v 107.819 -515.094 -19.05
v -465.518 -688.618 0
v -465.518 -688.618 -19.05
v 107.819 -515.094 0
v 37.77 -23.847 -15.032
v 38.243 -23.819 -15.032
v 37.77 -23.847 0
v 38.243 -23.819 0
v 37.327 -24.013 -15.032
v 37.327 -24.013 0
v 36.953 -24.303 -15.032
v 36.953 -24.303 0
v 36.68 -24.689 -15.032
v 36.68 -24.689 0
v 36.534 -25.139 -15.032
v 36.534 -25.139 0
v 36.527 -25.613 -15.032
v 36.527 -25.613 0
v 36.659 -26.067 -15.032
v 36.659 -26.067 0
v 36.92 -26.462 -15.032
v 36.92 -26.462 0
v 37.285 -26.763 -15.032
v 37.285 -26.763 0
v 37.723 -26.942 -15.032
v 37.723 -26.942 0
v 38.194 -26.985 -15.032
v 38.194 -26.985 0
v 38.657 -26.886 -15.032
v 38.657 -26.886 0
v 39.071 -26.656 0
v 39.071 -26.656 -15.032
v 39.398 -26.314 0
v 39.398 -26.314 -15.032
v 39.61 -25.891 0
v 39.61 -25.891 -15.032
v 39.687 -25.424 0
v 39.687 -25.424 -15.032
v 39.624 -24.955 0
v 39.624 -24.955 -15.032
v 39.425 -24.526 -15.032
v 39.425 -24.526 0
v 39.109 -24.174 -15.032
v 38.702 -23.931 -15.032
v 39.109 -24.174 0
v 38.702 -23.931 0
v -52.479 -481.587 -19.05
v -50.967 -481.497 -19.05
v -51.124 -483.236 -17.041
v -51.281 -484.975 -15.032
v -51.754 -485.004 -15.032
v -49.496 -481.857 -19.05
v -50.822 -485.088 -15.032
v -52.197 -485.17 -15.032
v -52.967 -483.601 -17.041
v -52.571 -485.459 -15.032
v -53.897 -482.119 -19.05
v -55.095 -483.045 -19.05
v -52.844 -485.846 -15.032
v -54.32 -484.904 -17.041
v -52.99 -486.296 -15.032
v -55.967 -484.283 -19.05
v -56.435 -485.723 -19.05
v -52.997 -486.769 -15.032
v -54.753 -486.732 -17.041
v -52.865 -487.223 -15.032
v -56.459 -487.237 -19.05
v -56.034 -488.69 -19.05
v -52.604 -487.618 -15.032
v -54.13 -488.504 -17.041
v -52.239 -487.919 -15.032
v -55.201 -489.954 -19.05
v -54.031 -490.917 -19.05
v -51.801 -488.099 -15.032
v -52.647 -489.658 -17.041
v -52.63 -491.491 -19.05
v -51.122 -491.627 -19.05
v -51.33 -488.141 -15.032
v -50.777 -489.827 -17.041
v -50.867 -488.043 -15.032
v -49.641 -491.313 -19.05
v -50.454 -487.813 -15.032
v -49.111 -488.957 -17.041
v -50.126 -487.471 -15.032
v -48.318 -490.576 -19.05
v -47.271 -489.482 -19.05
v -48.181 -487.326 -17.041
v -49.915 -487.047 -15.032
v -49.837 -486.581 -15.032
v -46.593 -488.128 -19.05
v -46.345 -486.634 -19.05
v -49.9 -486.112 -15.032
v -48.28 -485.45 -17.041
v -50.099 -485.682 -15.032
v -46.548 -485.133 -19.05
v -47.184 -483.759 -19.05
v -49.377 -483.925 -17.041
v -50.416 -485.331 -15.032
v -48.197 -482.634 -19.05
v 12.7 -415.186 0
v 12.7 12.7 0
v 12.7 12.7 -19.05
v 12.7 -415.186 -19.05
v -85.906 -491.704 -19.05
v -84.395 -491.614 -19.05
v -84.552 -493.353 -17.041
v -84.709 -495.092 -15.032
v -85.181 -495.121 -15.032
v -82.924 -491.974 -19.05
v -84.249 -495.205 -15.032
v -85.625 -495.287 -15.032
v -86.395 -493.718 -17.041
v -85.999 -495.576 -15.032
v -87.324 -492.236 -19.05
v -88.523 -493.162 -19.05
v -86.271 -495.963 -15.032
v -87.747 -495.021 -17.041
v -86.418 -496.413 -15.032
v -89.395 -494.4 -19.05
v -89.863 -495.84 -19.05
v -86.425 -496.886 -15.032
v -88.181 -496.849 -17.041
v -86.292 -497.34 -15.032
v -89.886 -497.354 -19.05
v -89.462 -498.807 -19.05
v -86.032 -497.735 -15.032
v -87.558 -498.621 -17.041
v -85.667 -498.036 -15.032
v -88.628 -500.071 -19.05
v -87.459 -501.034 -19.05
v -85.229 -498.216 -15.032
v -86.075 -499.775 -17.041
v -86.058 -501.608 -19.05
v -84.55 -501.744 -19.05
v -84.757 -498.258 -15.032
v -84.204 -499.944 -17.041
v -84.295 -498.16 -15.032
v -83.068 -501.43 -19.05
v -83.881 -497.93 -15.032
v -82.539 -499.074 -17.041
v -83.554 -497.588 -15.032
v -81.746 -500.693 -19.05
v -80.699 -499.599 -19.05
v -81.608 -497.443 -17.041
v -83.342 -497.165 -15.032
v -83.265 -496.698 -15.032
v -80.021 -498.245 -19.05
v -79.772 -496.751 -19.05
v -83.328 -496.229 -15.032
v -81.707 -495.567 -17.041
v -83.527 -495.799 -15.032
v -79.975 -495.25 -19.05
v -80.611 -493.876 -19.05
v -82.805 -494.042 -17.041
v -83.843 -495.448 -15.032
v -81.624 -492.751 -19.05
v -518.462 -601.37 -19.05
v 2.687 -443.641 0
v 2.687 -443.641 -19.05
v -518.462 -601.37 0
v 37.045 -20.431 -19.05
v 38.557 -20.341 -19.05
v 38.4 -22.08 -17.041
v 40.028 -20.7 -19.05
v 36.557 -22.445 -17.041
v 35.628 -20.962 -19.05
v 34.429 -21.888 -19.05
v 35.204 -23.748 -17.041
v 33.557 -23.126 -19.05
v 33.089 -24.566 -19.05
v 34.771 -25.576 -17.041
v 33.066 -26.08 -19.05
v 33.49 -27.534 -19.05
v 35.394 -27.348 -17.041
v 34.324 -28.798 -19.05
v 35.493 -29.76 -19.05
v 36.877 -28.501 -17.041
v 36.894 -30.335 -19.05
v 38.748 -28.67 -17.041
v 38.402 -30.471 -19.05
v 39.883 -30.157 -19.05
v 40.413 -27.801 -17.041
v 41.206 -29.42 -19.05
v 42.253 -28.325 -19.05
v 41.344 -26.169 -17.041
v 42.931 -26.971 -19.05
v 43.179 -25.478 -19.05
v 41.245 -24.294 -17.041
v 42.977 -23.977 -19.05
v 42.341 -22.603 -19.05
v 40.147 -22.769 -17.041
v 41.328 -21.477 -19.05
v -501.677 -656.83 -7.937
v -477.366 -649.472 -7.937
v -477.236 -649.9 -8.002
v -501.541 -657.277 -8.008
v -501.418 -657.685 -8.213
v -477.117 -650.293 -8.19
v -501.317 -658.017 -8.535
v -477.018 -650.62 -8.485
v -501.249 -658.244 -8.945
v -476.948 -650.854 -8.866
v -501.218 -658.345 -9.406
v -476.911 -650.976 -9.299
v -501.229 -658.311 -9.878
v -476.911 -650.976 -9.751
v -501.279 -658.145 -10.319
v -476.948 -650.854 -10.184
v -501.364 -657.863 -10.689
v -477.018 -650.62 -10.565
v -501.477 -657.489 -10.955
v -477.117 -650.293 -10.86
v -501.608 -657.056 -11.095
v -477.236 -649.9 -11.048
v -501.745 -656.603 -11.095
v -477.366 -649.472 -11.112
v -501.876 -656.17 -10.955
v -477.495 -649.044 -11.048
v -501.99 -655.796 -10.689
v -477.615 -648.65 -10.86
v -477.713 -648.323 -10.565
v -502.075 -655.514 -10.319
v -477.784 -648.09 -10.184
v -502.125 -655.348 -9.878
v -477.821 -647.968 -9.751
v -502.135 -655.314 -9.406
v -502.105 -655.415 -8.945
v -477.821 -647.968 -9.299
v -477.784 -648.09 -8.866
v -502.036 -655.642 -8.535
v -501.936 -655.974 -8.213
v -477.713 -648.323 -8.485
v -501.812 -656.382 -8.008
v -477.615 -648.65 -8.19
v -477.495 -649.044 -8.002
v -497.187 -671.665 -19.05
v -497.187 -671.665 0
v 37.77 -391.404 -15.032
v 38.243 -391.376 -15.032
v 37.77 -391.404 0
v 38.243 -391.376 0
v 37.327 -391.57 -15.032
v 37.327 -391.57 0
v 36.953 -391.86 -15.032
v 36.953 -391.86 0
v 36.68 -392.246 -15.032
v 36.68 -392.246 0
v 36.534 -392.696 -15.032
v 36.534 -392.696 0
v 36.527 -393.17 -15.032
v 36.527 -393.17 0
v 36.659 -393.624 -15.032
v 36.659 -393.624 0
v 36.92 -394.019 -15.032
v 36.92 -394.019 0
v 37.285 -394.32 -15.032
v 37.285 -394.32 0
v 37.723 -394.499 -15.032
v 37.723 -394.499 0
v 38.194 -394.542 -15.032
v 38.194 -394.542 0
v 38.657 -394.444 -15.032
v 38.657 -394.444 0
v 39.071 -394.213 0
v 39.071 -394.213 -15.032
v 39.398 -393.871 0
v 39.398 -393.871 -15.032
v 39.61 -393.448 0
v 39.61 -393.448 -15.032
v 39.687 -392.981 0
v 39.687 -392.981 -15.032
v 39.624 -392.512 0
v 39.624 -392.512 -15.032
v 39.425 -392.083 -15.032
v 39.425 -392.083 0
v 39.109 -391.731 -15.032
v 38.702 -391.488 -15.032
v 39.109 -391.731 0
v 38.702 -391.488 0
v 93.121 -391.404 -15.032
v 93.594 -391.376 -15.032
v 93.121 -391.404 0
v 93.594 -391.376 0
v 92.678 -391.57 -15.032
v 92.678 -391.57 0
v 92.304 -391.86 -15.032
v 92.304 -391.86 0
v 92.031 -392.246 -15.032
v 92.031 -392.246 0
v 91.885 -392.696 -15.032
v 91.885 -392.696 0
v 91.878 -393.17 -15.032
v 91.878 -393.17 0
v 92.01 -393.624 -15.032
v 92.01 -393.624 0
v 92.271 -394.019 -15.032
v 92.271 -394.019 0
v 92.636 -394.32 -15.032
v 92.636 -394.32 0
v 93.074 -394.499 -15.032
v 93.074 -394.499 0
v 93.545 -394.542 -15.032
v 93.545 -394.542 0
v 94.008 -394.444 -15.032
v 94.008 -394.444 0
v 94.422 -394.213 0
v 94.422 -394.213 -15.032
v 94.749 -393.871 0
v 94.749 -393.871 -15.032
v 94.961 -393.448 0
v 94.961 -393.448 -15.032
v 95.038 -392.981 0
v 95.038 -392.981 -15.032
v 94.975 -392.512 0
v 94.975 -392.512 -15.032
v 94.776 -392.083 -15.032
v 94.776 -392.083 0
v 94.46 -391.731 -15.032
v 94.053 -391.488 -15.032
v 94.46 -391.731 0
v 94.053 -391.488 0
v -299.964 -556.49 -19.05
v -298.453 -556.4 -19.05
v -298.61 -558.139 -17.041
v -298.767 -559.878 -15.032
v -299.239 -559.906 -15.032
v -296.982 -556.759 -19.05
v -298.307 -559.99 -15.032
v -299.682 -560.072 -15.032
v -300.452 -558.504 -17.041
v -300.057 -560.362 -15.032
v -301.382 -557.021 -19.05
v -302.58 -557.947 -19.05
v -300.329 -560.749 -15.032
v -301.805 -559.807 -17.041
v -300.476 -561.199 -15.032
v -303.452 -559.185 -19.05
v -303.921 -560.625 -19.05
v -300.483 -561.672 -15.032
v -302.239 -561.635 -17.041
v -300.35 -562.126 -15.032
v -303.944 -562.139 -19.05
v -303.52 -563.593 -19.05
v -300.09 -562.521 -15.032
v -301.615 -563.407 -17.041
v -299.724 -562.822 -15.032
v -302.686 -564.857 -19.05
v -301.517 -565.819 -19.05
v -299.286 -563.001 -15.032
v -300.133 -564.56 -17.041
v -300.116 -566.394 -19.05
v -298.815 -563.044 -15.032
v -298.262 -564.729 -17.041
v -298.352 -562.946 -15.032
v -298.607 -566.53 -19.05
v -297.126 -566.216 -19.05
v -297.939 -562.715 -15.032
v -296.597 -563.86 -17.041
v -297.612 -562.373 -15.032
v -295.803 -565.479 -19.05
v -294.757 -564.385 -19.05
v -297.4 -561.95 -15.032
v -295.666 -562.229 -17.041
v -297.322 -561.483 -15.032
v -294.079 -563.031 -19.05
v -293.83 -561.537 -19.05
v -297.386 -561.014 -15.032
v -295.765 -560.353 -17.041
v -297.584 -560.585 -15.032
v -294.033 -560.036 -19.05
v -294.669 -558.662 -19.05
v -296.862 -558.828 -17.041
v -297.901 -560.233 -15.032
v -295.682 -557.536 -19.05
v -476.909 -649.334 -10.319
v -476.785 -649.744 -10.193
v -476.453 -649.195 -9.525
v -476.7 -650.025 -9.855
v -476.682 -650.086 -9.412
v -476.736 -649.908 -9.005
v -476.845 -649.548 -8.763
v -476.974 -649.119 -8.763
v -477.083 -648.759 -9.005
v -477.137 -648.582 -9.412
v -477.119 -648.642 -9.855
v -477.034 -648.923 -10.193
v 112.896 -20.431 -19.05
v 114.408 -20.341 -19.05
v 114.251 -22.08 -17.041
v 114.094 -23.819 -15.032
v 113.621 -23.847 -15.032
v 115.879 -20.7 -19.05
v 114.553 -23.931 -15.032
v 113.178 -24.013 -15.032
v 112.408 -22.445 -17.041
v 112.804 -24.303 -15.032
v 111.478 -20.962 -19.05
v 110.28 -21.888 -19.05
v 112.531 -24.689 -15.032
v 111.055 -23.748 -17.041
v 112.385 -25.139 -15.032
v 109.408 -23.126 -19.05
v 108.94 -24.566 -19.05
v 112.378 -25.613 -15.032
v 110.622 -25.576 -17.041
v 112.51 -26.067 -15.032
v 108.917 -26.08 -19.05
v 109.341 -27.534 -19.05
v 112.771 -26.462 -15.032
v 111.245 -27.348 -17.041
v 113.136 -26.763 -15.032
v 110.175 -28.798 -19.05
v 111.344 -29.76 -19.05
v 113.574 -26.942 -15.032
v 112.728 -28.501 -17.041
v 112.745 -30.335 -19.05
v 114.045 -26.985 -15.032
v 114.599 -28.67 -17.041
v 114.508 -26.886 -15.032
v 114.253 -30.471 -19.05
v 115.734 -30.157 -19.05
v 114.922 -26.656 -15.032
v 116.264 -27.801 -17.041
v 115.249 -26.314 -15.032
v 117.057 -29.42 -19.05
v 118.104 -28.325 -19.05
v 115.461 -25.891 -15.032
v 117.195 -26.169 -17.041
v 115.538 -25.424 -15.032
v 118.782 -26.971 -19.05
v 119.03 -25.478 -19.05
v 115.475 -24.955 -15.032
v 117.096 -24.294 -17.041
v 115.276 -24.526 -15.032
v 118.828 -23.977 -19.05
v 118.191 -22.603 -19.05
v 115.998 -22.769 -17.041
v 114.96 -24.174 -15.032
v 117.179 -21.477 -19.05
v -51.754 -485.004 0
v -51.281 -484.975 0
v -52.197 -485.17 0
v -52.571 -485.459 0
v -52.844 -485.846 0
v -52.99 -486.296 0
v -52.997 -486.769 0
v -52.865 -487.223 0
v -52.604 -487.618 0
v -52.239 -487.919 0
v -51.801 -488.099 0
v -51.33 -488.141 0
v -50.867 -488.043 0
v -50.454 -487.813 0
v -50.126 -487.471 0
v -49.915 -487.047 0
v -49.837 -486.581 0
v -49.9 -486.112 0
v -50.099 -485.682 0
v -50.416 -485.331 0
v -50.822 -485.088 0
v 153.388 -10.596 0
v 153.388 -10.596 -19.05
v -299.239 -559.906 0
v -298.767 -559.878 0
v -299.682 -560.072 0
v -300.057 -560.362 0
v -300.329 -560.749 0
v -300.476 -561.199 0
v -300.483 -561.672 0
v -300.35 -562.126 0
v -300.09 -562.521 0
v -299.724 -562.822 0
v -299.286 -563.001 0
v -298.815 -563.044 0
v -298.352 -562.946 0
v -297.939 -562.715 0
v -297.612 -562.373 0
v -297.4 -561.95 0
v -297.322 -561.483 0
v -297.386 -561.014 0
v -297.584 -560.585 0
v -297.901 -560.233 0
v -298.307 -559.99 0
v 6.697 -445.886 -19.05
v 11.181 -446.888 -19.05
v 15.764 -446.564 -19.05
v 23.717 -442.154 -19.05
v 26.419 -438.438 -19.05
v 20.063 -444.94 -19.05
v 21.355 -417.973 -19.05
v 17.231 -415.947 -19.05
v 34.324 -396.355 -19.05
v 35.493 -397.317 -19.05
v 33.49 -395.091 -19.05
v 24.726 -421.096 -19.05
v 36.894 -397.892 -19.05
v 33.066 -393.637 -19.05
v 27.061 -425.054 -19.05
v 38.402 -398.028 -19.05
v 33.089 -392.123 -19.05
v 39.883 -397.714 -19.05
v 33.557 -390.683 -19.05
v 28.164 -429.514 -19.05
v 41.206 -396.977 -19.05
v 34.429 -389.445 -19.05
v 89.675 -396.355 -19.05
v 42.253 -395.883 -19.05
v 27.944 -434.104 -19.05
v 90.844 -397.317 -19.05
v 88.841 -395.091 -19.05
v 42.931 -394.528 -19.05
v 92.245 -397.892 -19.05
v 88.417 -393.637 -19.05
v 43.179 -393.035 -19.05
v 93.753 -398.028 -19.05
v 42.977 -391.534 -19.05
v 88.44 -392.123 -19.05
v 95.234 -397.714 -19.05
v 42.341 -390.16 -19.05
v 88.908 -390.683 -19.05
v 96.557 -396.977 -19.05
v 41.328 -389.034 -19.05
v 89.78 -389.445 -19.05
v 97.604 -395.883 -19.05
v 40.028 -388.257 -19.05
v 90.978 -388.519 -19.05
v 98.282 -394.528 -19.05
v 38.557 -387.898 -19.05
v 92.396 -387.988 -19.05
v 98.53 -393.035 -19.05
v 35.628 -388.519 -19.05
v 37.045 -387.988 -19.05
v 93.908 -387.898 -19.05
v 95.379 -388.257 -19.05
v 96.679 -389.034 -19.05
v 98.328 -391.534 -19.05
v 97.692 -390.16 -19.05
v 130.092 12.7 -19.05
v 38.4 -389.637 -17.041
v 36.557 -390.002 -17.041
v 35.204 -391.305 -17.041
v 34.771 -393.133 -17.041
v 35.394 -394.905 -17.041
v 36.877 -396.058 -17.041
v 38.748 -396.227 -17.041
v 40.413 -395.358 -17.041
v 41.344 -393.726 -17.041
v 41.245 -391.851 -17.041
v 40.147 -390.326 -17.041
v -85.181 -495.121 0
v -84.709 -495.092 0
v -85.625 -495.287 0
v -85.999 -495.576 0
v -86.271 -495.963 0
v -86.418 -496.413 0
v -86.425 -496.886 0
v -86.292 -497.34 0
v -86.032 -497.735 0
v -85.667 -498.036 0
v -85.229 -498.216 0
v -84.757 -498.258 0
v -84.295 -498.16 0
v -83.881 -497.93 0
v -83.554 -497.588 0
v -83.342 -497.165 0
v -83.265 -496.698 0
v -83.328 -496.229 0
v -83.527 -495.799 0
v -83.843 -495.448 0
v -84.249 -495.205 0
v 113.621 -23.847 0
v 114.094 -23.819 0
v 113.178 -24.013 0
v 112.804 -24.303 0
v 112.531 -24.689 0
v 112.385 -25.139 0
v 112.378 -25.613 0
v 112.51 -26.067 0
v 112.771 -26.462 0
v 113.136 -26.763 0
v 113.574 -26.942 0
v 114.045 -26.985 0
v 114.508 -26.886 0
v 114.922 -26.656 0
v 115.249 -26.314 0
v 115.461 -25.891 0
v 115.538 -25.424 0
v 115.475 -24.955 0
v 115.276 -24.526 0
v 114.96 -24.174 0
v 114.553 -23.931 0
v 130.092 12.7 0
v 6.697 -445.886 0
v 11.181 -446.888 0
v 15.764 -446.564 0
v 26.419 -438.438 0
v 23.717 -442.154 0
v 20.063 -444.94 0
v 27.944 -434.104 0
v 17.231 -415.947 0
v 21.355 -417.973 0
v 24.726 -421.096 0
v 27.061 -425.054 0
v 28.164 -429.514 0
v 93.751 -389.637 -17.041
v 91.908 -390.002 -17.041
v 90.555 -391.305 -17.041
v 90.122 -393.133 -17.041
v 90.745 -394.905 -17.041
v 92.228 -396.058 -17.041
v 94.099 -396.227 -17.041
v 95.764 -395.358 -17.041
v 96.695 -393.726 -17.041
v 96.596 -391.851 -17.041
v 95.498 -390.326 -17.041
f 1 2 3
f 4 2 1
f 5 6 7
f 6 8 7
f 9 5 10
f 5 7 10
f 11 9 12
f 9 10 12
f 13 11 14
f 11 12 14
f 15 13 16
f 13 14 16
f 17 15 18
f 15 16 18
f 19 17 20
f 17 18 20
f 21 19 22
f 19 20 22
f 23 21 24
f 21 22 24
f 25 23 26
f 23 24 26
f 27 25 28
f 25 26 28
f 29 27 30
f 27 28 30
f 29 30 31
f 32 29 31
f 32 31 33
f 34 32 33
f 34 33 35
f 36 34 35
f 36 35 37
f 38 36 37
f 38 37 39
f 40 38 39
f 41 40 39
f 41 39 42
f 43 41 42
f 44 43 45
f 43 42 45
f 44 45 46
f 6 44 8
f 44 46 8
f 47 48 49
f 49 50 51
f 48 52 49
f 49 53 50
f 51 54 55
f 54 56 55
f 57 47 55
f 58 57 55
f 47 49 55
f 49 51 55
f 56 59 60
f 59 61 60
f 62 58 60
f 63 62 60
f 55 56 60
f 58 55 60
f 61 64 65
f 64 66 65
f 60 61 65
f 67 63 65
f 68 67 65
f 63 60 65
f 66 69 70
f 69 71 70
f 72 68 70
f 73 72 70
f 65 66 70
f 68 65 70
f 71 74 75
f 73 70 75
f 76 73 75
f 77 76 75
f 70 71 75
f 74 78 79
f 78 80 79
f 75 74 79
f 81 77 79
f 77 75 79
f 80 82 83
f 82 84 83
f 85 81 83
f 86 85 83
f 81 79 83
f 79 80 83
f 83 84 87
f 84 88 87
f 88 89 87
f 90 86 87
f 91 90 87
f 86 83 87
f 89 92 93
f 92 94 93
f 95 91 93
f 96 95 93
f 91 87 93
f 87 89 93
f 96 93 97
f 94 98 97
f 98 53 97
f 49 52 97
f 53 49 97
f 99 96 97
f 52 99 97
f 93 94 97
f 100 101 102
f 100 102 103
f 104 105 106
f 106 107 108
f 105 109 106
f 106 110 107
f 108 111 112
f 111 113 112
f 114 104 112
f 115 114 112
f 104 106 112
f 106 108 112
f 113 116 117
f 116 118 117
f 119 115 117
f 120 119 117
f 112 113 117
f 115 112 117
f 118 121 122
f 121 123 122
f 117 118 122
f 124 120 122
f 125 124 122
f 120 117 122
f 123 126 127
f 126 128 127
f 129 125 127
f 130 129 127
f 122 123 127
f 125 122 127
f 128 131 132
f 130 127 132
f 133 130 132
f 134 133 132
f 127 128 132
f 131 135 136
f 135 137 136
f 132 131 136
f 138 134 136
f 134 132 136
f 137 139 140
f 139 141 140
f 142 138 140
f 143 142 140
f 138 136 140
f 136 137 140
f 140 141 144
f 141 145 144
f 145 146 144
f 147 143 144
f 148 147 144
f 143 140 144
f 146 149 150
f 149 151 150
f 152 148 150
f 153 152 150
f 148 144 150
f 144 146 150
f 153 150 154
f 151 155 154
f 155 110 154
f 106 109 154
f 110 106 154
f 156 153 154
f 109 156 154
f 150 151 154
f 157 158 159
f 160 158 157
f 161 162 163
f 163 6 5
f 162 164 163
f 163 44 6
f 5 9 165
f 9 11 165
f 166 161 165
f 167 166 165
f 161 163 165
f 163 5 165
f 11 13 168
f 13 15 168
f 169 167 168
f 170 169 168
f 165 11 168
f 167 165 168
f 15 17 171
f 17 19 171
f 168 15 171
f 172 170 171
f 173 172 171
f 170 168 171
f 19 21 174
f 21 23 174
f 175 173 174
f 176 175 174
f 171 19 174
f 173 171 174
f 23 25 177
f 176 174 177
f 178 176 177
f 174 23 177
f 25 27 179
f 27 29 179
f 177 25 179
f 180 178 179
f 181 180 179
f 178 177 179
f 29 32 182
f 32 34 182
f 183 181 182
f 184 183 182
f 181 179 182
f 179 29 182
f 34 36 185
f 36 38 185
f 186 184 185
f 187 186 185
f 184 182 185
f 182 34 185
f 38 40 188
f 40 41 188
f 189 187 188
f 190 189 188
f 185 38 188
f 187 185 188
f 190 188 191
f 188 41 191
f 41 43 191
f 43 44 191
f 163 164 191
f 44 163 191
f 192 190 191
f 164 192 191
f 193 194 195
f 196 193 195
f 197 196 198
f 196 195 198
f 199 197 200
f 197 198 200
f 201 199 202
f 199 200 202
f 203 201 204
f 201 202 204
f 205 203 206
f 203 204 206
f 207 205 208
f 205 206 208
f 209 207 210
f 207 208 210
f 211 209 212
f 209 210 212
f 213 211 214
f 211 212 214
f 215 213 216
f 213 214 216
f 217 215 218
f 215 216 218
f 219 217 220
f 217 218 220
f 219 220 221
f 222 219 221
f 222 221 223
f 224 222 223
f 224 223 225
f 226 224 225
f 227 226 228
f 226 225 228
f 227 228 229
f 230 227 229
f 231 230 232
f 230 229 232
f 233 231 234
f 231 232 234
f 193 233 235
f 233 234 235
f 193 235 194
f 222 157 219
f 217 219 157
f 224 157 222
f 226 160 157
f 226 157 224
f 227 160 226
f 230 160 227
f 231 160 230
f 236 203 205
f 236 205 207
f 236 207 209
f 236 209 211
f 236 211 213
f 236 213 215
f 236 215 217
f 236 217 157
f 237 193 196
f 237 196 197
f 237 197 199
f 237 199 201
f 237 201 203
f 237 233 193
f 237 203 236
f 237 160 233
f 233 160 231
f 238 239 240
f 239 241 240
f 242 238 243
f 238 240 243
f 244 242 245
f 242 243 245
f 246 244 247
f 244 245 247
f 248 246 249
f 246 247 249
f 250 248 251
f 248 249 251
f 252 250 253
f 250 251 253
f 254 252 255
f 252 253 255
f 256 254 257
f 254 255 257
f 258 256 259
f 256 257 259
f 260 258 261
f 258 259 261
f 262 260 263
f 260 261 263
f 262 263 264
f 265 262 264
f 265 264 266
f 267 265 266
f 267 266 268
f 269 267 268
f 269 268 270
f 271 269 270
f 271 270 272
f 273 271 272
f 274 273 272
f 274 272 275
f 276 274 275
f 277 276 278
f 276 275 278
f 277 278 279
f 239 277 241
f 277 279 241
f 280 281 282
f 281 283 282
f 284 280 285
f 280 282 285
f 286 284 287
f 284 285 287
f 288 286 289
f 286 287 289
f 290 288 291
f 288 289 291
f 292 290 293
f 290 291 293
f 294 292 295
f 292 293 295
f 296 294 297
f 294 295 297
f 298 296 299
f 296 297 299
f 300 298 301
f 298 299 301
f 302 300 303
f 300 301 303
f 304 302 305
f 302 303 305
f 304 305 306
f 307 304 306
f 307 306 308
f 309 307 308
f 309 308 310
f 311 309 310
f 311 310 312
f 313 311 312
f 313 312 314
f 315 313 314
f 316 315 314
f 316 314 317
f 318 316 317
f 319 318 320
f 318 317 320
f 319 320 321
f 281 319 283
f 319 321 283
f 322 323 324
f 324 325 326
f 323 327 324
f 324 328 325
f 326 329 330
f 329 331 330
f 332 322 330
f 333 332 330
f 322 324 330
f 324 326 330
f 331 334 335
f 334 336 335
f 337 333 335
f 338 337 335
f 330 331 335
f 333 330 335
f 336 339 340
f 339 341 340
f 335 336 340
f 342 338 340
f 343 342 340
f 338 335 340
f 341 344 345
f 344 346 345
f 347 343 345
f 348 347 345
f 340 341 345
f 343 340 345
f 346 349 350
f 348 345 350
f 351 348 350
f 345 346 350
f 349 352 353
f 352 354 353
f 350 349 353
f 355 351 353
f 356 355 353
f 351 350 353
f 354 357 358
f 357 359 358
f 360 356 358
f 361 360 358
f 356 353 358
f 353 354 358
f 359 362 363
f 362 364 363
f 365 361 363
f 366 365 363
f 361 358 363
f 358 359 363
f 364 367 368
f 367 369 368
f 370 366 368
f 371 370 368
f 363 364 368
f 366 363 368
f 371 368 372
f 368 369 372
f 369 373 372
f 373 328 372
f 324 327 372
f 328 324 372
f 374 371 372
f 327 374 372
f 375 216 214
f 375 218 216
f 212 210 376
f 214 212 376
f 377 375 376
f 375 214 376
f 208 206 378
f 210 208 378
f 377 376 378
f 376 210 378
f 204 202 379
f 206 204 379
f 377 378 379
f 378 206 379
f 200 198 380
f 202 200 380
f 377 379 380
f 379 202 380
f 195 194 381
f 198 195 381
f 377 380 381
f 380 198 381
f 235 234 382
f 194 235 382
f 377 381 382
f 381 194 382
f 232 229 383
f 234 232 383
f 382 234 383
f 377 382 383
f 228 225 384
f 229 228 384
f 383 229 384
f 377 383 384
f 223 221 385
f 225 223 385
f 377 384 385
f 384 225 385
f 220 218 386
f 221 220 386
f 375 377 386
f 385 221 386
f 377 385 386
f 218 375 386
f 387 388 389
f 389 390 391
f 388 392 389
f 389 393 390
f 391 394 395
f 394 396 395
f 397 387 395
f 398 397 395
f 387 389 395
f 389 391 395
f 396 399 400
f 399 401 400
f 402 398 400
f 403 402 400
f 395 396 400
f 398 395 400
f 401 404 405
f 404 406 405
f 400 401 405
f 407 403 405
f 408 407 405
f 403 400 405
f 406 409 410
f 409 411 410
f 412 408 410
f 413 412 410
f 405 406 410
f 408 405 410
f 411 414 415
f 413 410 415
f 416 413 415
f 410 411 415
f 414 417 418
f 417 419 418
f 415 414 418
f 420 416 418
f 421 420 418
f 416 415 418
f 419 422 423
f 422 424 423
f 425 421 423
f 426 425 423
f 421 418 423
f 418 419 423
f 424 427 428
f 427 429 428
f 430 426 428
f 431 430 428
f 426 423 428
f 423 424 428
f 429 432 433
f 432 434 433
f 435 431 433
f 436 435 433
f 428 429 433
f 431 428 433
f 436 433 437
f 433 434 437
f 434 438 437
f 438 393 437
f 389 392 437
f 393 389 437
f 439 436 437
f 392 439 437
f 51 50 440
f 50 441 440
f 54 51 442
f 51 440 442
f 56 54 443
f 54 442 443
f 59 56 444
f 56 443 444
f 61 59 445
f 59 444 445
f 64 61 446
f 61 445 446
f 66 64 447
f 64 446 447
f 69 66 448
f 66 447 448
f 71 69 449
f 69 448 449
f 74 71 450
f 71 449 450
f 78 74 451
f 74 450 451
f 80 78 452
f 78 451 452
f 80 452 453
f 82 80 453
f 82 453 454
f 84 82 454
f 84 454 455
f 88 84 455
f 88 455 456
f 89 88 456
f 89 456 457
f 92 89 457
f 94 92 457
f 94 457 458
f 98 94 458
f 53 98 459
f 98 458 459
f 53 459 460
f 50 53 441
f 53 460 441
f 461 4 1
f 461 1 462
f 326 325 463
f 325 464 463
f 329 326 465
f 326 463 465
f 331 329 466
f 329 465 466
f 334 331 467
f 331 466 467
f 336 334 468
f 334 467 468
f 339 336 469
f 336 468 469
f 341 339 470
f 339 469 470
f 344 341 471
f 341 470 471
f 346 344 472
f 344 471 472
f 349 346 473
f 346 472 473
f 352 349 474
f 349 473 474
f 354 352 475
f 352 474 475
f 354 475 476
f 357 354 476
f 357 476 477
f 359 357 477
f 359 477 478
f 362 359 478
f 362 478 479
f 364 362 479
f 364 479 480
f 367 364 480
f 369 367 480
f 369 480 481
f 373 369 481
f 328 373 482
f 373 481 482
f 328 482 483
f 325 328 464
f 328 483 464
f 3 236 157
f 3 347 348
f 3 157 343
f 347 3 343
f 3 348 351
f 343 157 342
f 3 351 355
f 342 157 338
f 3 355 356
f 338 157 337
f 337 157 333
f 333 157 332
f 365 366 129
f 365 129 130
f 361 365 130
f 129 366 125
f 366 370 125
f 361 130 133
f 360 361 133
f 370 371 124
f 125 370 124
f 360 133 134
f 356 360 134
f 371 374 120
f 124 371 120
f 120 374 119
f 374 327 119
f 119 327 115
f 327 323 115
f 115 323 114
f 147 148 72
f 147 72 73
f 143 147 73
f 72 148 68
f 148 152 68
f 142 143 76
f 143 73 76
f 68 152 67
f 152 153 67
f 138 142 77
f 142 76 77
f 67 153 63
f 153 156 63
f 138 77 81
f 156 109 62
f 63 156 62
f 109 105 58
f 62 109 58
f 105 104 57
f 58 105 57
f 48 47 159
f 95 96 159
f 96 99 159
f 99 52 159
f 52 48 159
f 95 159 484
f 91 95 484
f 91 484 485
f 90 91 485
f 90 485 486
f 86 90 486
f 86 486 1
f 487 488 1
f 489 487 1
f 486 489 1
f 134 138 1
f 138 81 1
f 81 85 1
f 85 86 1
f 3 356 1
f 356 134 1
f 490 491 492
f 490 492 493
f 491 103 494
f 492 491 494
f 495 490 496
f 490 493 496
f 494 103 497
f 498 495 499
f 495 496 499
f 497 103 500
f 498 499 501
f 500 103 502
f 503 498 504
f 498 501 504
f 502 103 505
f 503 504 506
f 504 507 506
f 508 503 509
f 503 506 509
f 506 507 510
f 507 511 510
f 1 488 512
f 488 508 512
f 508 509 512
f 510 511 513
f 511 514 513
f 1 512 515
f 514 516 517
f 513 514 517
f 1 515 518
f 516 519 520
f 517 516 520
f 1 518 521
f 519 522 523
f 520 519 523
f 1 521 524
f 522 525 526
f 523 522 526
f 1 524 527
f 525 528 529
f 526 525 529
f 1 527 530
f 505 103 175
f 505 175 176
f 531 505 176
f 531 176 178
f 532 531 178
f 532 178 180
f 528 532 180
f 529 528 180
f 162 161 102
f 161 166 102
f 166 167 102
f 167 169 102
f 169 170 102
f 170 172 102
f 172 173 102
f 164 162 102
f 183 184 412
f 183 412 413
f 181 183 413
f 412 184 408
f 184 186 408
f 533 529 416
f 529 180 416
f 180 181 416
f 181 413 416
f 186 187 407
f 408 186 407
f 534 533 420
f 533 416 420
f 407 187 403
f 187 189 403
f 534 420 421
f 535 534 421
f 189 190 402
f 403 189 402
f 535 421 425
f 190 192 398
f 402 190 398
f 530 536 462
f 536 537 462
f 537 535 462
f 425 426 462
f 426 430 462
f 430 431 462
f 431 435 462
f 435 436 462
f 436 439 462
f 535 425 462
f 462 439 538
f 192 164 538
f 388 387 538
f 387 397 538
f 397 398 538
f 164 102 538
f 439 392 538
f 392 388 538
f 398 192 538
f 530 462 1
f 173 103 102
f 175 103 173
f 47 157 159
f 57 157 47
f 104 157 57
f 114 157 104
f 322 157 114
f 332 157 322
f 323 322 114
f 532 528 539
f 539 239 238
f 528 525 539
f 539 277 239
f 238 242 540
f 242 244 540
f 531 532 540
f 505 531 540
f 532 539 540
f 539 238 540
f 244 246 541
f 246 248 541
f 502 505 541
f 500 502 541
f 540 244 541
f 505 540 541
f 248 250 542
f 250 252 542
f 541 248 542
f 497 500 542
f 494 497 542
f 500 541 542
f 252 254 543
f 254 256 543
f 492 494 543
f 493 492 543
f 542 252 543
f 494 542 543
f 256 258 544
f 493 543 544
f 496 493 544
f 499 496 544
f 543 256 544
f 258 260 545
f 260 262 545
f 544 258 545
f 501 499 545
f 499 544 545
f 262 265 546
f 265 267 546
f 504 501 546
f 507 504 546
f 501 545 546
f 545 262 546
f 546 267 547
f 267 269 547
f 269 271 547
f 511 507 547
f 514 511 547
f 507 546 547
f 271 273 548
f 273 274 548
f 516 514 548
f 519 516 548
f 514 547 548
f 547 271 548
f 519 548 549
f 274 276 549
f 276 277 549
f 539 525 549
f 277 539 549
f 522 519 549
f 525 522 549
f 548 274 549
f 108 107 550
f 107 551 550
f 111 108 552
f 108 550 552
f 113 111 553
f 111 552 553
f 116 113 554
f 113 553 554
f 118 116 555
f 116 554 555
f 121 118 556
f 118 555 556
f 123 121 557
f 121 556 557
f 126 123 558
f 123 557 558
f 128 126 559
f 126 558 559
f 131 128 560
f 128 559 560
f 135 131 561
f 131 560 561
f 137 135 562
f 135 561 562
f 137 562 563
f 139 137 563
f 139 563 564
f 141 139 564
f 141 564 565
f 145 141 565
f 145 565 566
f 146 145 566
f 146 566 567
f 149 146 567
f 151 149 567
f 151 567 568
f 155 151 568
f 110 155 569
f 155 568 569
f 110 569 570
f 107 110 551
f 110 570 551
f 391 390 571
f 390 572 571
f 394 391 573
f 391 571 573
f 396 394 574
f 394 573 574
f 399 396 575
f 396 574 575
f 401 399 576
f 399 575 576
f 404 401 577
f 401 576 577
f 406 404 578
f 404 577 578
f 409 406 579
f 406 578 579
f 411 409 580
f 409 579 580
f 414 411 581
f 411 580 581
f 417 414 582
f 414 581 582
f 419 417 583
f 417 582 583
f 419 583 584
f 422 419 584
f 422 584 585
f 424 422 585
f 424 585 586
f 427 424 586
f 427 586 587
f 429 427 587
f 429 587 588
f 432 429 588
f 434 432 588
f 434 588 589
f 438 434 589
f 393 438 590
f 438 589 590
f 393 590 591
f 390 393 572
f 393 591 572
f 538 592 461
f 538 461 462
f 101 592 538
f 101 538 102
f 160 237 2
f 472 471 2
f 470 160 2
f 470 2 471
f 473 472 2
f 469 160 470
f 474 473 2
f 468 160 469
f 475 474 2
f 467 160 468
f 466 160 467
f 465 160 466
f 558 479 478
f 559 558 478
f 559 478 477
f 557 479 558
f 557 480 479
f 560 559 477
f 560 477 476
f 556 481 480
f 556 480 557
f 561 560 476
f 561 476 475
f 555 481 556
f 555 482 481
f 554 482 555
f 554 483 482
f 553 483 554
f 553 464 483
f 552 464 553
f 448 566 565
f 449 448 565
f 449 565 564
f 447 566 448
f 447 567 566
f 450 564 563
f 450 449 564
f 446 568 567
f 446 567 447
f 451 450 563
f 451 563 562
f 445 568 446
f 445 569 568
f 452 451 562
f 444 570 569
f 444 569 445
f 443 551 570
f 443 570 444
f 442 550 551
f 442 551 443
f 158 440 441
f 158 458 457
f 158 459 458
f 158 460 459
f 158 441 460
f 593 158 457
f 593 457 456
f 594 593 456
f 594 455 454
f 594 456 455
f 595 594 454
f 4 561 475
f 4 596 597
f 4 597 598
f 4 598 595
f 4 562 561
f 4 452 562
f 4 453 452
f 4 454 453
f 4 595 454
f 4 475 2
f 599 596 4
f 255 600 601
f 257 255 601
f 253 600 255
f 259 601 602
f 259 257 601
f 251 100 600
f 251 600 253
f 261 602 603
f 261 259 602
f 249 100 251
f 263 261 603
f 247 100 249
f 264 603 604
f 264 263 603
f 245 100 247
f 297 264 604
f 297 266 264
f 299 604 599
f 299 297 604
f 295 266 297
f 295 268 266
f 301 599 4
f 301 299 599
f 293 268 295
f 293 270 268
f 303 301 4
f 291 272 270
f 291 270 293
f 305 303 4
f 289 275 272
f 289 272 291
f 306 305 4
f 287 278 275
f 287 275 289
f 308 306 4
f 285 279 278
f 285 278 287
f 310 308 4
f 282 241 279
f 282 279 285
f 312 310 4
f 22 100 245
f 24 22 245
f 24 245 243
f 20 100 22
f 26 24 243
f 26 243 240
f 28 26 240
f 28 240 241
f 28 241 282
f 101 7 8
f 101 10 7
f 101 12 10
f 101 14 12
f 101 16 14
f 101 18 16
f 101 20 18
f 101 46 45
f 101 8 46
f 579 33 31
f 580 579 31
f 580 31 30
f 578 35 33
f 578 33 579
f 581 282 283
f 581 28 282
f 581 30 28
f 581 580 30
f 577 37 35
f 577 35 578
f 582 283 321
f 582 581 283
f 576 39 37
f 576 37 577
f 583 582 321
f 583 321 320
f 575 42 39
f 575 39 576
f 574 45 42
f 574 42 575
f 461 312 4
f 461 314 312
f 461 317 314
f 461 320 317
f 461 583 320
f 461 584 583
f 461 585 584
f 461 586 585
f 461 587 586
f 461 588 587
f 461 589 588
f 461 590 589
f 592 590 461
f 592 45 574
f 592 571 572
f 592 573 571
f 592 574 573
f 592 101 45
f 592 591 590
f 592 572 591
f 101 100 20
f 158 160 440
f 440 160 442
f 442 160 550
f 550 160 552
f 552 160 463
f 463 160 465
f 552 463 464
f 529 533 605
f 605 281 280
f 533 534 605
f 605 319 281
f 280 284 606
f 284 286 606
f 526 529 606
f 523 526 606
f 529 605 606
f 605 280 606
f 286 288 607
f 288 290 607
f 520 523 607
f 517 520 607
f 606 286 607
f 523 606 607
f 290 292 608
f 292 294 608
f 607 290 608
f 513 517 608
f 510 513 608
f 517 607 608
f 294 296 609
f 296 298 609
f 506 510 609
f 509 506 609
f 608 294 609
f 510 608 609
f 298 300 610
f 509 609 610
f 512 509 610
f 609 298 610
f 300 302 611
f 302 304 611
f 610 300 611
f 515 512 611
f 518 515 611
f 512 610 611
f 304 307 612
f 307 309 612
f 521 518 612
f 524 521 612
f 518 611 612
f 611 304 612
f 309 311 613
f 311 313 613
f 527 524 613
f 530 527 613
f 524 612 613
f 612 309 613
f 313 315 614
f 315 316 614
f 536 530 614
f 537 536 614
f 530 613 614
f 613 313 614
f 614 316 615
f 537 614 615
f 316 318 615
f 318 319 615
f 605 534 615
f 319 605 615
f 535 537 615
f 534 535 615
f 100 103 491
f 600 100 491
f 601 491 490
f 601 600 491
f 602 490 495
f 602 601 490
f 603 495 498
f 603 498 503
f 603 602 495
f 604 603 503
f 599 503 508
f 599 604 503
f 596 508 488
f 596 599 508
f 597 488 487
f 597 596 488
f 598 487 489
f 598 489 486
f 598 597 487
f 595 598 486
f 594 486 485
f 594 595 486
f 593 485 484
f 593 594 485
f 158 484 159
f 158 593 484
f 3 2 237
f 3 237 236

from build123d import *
from OCP.BRepFilletAPI import BRepFilletAPI_MakeChamfer

# Parameters (mm, degrees)
BOSS_EXTRUDE1_DEPTH = 19.05
CHAMFER1_SIZE       = 25.4
CHAMFER1_SIZE2      = 23.3906272
HOLE5_D             = 3.175
HOLE5_DEPTH         = 38.1
HOLE5_CSINK_D       = 10.16
HOLE5_CSINK_ANGLE   = 82
HOLE5_TIP           = 0.953866233
HOLE6_D             = 3.175
HOLE6_DEPTH         = 38.1
HOLE6_CSINK_D       = 10.16
HOLE6_CSINK_ANGLE   = 82
HOLE6_TIP           = 0.953866233


with BuildPart() as part:
    # Sketch1 → Boss-Extrude1 (new body)
    with BuildSketch(Plane.XY):
        with BuildLine():
            Line((12.7, 12.7), (12.7, -415.185594934))
            ThreePointArc((12.7, -415.185594934), (27.339445595, -436.32629993), (2.687239133, -443.641454859))
            Line((2.687239133, -443.641454859), (-518.461959982, -601.369999539))
            Line((-518.461959982, -601.369999539), (-489.829069295, -695.97562771))
            Line((-489.829069295, -695.97562771), (107.818813597, -515.094354248))
            Line((107.818813597, -515.094354248), (155.492294041, 12.7))
            Line((155.492294041, 12.7), (12.7, 12.7))
        make_face()
    extrude(amount=-BOSS_EXTRUDE1_DEPTH)

    # Chamfer1: one chamfer whose edges measure the first distance from different faces: ONE call of the kernel's chamfer builder (chamfer() names one face for all edges)
    chamfer1_edges_1 = [part.edges().sort_by_distance(p)[0] for p in [
        (155.492294041, 12.7, -9.525),
    ]]
    chamfer1_side_1 = [part.faces().sort_by_distance(p)[0] for p in [
        (84.09614702, 12.7, -9.525),
    ]]
    chamfer1_edges_2 = [part.edges().sort_by_distance(p)[0] for p in [
        (-489.829069295, -695.97562771, -9.525),
    ]]
    chamfer1 = BRepFilletAPI_MakeChamfer(part.part.solid().wrapped)
    for e in chamfer1_edges_1:
        chamfer1.Add(CHAMFER1_SIZE, CHAMFER1_SIZE2, e.wrapped, chamfer1_side_1[0].wrapped)  # the first distance lies on this face
    for e in chamfer1_edges_2:
        chamfer1.Add(CHAMFER1_SIZE, e.wrapped)
    add(Compound.cast(chamfer1.Shape()), mode=Mode.REPLACE)

    # Hole5
    with Locations(Plane(origin=(155.286738577, 10.424290059, -19.05), x_dir=(-0.08995962873759064, -0.9959454127598535, 0), z_dir=(0, 0, -1))):
        with Locations((46.221112845, 113.488854888), (39.39759596, 37.945520226), (412.28786892, 80.423559293), (407.308516105, 25.297013484), (513.561319184, 161.164706775), (597.46020397, 127.267357003), (610.543339245, 159.649253123), (694.322923815, 367.011001477), (526.644454459, 193.546602895), (610.424039029, 400.908351249)):
            CounterSinkHole(HOLE5_D / 2, HOLE5_CSINK_D / 2, depth=HOLE5_DEPTH, counter_sink_angle=HOLE5_CSINK_ANGLE)
            with Locations((0, 0, -(HOLE5_DEPTH + HOLE5_TIP / 2))):  # 118° drill point
                Cone(0, HOLE5_D / 2, HOLE5_TIP, mode=Mode.SUBTRACT)

    # Hole6
    with Locations(Plane(origin=(-643.705760022, -231.394989772, 165.474999994), x_dir=(0, 0, -1), z_dir=(-0.9571239768071421, -0.2896786029738502, -1.2569443472852944e-15))):
        with Locations((-108.649999997, 332.89193461), (108.649999997, 332.89193461), (207.774999994, 332.89193461), (174.999999994, 448.336332751), (135.266666663, 384.042401694), (176.283333328, 384.042401694), (-174.999999994, 448.336332751), (-135.266666663, 384.042401694), (-176.283333328, 384.042401694), (-207.774999994, 332.89193461)):
            CounterSinkHole(HOLE6_D / 2, HOLE6_CSINK_D / 2, depth=HOLE6_DEPTH, counter_sink_angle=HOLE6_CSINK_ANGLE)
            with Locations((0, 0, -(HOLE6_DEPTH + HOLE6_TIP / 2))):  # 118° drill point
                Cone(0, HOLE6_D / 2, HOLE6_TIP, mode=Mode.SUBTRACT)


solid = part.part
